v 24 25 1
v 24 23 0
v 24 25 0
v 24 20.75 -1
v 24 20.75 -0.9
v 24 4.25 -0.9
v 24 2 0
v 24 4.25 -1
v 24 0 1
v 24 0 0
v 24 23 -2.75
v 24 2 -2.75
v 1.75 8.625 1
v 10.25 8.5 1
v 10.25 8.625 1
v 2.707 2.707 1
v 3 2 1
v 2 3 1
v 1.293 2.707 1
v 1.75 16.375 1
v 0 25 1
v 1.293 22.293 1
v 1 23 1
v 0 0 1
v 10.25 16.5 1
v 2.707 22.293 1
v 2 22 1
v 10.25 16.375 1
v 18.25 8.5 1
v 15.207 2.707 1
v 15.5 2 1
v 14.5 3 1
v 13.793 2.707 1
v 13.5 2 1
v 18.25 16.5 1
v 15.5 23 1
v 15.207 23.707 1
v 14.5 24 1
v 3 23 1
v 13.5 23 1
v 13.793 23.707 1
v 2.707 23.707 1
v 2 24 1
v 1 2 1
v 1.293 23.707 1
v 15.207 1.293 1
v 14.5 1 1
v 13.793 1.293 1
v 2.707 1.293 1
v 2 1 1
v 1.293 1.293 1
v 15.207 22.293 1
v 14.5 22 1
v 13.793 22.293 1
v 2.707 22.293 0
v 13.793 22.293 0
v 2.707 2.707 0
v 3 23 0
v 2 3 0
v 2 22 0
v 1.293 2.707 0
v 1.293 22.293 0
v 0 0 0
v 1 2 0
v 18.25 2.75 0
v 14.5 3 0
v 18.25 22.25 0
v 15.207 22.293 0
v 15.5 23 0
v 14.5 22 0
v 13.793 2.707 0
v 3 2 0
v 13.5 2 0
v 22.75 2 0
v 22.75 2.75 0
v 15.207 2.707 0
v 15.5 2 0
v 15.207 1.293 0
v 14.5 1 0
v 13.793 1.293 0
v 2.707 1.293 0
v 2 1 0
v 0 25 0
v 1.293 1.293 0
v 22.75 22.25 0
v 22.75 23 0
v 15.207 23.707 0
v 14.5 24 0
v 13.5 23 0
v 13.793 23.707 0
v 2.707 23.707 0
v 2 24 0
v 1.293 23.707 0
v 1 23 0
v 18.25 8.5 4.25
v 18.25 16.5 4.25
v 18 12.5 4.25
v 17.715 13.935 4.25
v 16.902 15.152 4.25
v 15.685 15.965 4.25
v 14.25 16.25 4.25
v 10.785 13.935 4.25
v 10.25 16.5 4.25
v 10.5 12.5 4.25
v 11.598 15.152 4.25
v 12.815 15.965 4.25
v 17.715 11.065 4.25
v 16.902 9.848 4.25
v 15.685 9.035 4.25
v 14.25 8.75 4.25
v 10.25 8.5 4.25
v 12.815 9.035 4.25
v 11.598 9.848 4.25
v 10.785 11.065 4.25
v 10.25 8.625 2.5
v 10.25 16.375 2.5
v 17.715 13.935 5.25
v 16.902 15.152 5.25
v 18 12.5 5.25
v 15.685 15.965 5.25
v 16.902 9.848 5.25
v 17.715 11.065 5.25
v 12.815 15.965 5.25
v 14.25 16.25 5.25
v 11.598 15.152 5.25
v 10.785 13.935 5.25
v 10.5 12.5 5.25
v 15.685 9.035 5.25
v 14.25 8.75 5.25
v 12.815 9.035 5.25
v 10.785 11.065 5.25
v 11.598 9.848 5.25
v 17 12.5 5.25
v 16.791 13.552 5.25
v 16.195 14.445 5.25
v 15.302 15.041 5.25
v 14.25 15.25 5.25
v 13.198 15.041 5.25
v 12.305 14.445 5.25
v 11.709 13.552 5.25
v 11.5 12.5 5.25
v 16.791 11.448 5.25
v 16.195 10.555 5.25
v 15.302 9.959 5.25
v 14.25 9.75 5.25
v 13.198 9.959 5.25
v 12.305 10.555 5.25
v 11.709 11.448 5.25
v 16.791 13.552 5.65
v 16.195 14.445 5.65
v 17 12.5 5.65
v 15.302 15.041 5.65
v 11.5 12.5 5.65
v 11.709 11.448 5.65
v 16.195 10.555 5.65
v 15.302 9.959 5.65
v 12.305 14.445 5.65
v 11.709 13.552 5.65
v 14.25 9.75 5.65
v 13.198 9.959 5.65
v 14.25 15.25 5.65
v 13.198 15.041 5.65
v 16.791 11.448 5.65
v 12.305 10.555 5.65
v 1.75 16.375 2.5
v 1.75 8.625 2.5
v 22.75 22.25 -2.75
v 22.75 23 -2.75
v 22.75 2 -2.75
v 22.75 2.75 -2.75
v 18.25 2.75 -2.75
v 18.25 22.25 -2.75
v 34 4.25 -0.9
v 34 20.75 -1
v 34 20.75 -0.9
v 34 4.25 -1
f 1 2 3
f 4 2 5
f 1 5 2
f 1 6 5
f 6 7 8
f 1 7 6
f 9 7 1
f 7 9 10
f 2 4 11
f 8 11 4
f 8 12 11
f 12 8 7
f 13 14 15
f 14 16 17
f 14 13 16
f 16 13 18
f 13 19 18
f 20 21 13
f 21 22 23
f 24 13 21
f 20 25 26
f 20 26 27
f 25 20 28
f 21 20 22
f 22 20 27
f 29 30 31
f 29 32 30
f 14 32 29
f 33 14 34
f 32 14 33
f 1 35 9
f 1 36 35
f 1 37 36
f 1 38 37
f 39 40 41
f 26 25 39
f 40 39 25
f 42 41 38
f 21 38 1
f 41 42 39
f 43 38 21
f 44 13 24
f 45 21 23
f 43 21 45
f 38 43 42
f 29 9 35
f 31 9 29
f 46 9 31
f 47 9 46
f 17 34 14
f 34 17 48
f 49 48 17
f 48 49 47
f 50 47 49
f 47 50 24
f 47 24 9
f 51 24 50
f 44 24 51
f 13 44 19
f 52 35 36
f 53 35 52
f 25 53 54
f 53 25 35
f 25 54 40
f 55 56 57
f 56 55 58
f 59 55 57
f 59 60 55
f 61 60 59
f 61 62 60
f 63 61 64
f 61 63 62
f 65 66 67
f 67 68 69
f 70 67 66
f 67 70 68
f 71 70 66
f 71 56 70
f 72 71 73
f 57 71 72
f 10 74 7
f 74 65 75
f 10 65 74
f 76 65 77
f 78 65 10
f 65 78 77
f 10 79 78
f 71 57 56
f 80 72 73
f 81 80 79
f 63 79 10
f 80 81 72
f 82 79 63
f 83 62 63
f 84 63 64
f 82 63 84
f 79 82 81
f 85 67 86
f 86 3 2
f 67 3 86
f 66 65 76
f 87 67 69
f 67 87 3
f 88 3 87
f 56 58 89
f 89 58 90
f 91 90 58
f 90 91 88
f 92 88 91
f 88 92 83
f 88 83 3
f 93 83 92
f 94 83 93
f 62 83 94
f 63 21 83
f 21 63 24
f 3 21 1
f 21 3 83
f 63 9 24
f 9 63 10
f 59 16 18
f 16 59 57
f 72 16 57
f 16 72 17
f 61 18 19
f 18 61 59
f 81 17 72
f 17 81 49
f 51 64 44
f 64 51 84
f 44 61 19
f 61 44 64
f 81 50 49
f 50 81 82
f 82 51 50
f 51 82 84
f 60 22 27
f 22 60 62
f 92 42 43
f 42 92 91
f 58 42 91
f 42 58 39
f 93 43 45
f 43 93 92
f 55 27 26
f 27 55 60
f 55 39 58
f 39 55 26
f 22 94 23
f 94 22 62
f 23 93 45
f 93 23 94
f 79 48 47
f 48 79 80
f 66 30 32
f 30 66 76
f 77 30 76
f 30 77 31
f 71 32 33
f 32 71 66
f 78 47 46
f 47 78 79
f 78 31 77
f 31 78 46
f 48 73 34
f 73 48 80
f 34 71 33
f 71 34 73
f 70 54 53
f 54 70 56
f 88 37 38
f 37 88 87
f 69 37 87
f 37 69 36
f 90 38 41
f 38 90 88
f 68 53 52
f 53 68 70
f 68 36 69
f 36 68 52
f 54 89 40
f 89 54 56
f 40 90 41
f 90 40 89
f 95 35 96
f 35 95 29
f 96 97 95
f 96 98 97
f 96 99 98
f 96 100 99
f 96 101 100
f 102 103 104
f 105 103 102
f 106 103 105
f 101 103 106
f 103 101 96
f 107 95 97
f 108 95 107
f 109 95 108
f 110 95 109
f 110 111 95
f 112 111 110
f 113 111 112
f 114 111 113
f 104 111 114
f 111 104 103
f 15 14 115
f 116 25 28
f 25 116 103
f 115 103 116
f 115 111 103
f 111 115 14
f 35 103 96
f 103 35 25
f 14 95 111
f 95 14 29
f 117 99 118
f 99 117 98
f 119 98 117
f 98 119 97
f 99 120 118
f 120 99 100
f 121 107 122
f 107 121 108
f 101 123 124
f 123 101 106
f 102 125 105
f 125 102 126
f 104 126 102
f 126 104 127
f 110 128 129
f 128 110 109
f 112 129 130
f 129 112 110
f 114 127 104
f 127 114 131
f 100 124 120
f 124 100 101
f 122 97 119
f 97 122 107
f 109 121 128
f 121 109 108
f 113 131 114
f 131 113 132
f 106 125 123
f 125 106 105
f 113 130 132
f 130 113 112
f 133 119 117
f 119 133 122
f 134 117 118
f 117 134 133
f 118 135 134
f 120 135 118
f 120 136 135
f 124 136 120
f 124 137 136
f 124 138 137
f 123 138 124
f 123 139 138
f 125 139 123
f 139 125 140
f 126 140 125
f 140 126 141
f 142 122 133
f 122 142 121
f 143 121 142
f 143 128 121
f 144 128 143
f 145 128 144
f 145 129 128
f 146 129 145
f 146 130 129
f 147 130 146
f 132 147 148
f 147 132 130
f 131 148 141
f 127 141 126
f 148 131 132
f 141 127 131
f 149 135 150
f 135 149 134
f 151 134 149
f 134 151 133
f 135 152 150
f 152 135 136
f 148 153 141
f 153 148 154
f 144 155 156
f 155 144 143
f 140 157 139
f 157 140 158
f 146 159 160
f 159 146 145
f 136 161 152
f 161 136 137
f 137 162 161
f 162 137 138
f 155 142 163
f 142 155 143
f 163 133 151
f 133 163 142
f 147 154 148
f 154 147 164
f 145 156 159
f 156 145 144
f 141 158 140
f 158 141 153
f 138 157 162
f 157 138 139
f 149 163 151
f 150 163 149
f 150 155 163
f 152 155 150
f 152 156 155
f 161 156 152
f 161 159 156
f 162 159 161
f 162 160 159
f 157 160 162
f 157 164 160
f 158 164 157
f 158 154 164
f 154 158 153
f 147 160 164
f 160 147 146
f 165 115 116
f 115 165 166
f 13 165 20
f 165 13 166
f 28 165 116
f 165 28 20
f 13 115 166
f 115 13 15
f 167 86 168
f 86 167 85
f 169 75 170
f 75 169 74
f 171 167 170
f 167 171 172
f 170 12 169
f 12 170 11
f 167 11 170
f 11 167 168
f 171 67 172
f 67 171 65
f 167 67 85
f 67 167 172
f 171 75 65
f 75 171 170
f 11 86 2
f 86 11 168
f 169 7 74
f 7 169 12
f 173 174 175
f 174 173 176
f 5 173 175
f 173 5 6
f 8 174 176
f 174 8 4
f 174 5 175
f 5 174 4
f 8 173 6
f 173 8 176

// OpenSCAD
module rpi_camera() {
     color("darkblue")
	  difference() {
	  cube([24,25,1]);
	  translate([2,2,-1]) cylinder(d=2,h=3,$fn=8);
	  translate([2,23,-1]) cylinder(d=2,h=3,$fn=8);
	  translate([14.5,2,-1]) cylinder(d=2,h=3,$fn=8);
	  translate([14.5,23,-1]) cylinder(d=2,h=3,$fn=8);
     }
     color("DimGray") union() {
	  translate([10.25,8.5,1]) cube([8,8,3.25]);
	  translate([10.25+4,12.5,1+3.25]) cylinder(d=7.5,h=1,$fn=16);
	  translate([10.25+4,12.5,1+3.25+0.7]) cylinder(d=5.5,h=0.7,$fn=16);
     }
     color("orange") translate([1.75,8.625,1]) cube([8.5,7.75,1.5]);
     color("brown") translate([24-5.75,2.75,-2.75]) cube([4.5,19.5,2.75]);
     color("black") translate([22.75,2,-2.75]) cube([1.25,21,2.75]);
     color("grey") translate([24,4.25,-1]) cube([10,16.5,0.1]);
}
rpi_camera();
